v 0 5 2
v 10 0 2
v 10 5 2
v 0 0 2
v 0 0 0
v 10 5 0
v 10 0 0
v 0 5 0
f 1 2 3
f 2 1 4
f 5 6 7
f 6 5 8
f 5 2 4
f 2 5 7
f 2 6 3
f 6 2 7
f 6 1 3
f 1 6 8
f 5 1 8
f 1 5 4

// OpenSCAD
module box(width, depth, height) {
  cube([width, depth, height]);
}

// Example usage:
box(10, 5, 2);
